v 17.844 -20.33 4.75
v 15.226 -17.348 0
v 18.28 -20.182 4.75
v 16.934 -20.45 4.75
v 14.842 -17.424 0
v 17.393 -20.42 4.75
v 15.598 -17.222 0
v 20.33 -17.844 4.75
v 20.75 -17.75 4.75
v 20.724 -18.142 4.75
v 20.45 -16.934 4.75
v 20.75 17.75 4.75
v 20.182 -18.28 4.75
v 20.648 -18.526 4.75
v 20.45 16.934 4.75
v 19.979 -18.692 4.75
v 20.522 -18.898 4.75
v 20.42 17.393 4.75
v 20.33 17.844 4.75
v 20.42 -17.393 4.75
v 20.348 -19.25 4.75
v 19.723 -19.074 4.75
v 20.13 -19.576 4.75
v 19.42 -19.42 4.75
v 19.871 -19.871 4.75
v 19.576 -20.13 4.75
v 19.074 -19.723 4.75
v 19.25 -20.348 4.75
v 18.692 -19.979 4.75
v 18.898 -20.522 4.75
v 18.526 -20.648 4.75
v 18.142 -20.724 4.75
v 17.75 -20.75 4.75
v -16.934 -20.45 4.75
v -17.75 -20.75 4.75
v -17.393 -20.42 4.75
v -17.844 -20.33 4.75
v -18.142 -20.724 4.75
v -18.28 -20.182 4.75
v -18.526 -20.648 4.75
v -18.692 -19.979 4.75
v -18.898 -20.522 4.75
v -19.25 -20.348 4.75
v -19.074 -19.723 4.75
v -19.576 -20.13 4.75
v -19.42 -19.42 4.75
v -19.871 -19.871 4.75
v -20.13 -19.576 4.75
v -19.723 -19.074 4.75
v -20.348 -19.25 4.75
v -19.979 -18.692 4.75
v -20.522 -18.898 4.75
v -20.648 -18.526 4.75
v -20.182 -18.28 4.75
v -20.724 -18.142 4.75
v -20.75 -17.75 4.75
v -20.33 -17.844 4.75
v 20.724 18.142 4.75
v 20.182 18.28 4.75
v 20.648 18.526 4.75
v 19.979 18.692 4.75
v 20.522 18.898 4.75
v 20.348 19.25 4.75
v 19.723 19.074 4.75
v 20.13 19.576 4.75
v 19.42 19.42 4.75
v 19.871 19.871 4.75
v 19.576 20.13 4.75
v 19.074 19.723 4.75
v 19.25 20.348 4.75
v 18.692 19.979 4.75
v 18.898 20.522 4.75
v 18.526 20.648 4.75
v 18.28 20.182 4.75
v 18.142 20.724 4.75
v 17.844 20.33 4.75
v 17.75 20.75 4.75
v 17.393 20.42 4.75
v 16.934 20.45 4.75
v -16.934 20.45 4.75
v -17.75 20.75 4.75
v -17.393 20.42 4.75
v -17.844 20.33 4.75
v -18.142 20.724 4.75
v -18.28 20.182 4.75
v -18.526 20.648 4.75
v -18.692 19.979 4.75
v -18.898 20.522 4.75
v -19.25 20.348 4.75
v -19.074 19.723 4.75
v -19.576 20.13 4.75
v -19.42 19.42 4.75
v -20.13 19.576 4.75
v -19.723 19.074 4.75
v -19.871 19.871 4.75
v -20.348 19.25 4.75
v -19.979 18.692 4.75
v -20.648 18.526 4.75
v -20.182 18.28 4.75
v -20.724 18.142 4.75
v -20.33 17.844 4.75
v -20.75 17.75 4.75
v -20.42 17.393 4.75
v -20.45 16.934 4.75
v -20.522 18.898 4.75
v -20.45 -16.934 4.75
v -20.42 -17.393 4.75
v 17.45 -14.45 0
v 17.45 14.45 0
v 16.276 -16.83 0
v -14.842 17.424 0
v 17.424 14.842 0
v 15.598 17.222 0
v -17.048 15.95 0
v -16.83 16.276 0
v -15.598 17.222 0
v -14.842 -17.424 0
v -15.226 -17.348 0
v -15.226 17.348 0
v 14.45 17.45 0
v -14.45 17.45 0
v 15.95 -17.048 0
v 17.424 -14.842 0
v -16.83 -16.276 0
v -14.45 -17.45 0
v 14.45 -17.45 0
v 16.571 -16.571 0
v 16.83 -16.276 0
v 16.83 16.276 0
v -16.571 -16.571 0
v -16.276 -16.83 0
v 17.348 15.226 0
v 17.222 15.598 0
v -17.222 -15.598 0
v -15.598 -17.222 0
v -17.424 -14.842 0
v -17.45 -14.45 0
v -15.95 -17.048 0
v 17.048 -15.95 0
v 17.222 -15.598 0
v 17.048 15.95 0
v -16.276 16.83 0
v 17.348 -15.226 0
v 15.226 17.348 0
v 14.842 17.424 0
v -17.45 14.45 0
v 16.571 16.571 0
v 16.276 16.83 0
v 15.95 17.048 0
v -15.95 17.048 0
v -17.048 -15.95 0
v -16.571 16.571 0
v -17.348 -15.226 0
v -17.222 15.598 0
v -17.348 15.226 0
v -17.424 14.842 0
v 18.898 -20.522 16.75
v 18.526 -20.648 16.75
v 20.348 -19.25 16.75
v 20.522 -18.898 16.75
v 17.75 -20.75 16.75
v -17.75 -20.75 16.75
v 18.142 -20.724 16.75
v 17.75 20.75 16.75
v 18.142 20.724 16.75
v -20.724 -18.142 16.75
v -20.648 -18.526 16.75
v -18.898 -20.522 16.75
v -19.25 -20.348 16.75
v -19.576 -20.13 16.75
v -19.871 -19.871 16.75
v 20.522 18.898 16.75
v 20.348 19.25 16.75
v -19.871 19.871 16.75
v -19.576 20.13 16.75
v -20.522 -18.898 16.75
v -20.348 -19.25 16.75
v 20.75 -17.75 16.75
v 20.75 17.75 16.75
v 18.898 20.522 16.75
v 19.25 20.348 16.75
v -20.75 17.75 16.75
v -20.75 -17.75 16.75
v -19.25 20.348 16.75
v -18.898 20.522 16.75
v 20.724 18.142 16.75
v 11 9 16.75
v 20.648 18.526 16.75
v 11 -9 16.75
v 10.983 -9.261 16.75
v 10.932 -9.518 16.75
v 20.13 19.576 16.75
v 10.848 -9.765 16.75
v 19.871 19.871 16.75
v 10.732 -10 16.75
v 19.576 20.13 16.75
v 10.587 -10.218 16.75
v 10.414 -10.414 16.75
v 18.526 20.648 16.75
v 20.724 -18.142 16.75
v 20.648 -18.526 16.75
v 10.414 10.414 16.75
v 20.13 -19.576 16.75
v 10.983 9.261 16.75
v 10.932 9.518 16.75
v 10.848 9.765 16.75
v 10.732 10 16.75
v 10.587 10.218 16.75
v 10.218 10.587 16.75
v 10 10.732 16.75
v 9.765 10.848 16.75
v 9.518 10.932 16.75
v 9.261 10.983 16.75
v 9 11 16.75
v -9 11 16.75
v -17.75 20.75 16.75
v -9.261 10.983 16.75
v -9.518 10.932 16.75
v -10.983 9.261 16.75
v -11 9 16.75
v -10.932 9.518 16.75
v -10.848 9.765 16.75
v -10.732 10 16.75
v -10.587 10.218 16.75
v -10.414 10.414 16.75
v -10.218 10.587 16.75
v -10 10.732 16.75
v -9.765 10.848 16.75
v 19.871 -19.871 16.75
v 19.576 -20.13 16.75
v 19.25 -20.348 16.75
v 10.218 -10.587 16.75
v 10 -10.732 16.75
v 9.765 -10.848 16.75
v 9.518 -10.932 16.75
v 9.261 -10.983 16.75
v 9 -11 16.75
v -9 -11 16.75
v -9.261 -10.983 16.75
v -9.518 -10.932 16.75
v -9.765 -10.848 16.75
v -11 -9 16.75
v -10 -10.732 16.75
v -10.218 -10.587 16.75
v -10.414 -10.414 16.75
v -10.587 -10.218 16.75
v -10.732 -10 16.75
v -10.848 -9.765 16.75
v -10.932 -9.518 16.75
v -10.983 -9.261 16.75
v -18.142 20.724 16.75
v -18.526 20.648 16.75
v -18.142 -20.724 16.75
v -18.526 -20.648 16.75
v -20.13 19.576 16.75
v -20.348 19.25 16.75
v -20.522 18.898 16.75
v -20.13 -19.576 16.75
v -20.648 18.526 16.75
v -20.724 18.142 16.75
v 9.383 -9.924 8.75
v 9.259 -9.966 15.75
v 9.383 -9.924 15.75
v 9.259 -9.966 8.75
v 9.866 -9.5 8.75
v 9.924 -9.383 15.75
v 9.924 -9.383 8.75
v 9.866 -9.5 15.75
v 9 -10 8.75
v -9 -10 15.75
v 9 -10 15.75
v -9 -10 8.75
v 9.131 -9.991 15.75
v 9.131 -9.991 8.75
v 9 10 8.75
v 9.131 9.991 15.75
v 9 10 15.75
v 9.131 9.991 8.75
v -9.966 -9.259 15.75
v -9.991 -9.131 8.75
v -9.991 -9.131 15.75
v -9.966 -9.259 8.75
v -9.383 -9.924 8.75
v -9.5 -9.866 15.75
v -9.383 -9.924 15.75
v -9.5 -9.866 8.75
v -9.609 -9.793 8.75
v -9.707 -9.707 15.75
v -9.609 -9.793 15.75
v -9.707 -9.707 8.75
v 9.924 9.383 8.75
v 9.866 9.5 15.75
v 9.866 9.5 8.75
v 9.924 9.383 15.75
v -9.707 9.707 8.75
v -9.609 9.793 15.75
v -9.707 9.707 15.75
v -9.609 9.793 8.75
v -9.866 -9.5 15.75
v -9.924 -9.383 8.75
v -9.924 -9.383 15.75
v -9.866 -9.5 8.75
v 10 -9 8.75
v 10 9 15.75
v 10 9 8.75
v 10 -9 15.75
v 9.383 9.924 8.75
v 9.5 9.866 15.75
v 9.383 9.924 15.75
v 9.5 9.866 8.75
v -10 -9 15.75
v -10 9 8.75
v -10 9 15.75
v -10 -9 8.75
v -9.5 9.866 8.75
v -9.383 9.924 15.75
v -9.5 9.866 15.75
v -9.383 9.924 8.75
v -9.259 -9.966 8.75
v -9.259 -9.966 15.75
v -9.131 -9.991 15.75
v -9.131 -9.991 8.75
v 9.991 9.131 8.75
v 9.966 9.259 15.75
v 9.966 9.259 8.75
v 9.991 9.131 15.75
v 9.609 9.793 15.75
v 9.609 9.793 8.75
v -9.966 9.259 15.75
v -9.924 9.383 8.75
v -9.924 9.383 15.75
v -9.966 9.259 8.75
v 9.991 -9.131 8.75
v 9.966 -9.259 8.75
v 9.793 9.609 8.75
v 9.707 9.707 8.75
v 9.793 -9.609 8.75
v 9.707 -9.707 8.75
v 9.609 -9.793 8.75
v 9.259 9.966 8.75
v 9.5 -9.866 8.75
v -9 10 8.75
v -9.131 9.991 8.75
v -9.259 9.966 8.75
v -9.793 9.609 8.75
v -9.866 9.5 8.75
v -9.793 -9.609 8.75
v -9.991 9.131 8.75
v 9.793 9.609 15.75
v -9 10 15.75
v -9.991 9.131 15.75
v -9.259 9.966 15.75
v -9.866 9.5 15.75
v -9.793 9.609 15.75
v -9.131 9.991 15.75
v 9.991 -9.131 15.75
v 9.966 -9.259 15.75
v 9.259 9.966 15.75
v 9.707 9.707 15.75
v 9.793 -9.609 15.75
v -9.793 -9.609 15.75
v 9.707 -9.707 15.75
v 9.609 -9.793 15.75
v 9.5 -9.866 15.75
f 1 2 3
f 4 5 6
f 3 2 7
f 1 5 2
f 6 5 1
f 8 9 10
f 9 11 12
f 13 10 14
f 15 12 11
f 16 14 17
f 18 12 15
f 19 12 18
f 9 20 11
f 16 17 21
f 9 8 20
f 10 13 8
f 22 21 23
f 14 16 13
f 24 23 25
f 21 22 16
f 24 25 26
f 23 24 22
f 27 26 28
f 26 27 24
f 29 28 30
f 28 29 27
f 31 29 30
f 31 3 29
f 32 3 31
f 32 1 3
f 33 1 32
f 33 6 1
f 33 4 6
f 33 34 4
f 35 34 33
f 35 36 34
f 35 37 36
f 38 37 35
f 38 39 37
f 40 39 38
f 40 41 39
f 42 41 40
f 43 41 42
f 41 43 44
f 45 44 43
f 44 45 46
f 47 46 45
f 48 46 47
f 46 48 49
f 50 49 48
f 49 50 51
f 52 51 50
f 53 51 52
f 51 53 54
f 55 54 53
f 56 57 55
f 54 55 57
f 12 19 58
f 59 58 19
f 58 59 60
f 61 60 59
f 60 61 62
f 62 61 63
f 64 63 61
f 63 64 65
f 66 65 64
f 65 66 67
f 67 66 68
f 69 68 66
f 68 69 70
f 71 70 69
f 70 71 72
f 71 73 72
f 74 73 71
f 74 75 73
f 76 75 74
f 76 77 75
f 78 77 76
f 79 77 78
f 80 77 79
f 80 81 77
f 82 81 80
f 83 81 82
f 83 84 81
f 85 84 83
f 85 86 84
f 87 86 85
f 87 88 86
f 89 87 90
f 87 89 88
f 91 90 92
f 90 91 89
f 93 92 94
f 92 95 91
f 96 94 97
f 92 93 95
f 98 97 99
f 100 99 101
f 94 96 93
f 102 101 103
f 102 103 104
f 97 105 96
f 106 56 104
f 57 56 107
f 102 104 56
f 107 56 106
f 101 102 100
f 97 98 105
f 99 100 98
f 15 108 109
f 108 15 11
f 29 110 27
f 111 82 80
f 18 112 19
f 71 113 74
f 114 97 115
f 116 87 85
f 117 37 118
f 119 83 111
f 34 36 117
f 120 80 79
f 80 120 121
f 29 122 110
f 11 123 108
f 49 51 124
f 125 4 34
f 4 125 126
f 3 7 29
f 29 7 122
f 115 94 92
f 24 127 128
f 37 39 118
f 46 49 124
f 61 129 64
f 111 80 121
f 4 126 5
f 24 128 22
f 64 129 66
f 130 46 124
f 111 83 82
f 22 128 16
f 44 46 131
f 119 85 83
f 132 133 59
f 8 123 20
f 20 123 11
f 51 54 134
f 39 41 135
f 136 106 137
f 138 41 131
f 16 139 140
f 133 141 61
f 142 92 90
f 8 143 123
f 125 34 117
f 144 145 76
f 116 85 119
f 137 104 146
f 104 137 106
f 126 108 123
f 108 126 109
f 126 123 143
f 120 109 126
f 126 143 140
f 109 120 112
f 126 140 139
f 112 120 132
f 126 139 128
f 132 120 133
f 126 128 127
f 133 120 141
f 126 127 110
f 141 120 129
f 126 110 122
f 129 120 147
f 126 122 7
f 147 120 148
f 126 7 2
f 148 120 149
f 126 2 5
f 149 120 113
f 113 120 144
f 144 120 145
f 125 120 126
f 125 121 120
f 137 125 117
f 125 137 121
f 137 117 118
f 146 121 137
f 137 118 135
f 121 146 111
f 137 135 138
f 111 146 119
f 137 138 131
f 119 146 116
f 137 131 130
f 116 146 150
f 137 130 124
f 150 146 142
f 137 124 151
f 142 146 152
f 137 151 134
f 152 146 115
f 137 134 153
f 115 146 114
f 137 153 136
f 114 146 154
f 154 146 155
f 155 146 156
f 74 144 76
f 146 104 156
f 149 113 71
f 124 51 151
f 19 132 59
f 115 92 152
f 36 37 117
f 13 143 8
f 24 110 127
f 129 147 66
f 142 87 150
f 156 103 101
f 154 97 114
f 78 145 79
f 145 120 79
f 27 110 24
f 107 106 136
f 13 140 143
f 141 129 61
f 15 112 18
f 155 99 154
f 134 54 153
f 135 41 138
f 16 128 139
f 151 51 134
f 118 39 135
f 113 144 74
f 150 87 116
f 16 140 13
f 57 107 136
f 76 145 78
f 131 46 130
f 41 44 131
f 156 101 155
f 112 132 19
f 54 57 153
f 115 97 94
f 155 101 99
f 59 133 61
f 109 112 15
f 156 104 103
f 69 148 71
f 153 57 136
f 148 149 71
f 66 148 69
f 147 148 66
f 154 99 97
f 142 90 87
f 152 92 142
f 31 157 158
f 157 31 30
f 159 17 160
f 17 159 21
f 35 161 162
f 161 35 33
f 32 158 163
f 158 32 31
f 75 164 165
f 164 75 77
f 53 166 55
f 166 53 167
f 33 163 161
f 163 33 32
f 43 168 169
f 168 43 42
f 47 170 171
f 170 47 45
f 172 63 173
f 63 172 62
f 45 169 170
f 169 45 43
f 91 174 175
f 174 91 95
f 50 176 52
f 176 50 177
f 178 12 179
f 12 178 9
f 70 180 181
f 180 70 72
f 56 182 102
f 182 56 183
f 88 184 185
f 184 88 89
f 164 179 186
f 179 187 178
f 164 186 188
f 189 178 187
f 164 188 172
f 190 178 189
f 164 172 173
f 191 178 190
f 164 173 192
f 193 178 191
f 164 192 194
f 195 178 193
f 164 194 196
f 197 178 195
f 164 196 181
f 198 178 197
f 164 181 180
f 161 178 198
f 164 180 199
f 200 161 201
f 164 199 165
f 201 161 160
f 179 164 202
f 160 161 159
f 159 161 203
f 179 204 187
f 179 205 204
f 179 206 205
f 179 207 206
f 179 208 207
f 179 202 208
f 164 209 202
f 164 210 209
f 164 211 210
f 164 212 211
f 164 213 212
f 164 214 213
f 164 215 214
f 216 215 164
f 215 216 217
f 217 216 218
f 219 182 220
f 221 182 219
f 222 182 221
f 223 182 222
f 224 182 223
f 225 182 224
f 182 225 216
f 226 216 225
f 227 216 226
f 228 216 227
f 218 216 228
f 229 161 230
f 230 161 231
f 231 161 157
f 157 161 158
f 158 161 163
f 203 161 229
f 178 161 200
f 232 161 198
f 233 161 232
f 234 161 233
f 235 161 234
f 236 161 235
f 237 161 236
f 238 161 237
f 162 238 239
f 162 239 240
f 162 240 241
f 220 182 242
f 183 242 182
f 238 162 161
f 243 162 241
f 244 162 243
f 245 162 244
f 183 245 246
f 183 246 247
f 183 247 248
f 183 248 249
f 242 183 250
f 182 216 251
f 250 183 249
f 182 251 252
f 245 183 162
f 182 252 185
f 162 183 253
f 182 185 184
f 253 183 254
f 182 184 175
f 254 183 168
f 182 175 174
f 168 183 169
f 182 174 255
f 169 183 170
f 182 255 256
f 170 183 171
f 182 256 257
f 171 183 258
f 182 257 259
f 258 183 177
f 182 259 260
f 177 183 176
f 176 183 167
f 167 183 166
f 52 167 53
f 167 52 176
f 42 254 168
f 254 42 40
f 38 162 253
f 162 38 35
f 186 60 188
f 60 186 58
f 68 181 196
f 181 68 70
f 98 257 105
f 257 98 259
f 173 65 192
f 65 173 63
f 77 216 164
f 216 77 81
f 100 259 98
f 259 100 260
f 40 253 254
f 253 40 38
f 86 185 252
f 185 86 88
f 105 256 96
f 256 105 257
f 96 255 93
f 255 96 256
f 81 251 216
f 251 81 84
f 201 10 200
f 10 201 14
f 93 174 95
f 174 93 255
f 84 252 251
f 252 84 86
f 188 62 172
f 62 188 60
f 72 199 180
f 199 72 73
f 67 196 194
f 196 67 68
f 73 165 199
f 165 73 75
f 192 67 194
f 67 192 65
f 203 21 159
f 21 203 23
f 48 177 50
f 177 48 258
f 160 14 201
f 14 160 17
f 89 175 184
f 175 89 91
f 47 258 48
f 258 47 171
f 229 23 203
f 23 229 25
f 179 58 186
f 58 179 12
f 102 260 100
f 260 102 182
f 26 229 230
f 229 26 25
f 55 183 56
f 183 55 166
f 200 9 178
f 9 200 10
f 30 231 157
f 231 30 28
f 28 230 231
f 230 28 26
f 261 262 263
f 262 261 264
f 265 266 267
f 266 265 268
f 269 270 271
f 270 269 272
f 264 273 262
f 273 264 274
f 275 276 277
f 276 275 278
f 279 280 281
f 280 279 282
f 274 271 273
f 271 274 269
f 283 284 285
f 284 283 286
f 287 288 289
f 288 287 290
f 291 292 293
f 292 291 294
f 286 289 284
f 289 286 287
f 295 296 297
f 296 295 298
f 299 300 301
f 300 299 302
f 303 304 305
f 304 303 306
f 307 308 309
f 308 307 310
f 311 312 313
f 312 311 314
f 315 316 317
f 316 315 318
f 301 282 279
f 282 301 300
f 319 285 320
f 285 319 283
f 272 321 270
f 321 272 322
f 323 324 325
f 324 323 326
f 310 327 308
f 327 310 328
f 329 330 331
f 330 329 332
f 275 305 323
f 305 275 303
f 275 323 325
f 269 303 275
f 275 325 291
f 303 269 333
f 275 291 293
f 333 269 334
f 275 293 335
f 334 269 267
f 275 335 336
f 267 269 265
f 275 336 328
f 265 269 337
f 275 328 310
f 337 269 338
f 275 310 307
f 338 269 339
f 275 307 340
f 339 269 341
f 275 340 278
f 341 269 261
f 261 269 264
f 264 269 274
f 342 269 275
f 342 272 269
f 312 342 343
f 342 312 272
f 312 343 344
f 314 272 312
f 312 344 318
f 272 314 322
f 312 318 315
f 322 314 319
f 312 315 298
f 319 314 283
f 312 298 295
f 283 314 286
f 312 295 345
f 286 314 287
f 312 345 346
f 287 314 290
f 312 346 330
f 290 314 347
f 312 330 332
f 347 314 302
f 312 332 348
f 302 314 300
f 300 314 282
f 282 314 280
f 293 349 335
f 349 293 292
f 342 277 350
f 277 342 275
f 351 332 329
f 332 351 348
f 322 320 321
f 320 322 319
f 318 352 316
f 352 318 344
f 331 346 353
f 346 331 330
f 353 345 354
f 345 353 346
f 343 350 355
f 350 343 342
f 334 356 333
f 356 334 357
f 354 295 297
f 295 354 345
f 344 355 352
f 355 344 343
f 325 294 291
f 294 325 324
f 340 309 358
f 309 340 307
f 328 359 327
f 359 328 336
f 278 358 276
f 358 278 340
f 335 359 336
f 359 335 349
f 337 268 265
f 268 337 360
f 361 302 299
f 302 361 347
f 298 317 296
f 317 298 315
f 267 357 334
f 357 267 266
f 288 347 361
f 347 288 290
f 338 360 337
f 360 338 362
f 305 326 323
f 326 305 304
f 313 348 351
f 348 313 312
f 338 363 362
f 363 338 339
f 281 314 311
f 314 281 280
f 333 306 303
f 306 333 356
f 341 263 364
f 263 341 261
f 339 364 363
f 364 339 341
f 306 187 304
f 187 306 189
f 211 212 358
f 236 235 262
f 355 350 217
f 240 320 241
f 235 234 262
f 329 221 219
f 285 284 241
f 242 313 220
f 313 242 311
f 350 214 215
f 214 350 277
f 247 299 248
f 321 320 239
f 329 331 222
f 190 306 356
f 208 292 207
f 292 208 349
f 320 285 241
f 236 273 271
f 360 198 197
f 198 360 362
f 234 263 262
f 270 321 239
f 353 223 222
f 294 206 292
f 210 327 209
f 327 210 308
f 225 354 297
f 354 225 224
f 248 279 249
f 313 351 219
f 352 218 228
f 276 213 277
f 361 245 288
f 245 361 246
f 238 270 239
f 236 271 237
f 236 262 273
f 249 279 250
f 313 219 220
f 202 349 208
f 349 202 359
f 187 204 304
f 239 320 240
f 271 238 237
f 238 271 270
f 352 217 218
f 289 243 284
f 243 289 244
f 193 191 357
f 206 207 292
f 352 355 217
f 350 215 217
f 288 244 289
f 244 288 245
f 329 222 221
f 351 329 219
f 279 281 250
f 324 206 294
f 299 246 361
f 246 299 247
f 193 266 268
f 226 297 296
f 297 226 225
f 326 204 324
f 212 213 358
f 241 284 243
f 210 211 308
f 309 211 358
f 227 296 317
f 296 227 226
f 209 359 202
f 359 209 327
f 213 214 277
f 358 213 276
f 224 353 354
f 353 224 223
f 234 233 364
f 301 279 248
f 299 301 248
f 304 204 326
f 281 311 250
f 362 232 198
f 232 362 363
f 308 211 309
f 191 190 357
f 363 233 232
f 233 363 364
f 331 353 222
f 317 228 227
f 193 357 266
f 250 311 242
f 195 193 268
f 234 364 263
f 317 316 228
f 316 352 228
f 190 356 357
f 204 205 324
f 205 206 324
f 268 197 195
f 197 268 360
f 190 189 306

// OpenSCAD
// Lab 2: 1x1 Gridfinity fit and robot-calibration holder.
// Confirm the foot against the real grid before using this geometry for other holders.

$fn = 48;

grid_pitch = 42;
foot_top_width = 41.5;
foot_bottom_width = 35.5;
foot_corner_radius = 3;
foot_taper_height = 4.75;

body_width = 41.5;
body_height = 12;
body_corner_radius = 3;

// Replace these placeholders with the measured test object or calibration target.
pocket_x = 20;
pocket_y = 20;
pocket_depth = 8;
pocket_corner_radius = 1;
lead_in = 1;

// Lab 1 found a usable clearance between 0.2 and 0.4 mm; verify the chosen fit on the grid.
foot_clearance = 0.3;

module rounded_rectangle(width, length, radius) {
    offset(r = radius)
        offset(delta = -radius)
            square([width, length], center = true);
}

module gridfinity_foot() {
    linear_extrude(
        height = foot_taper_height,
        scale = (foot_top_width - 2 * foot_clearance) / (foot_bottom_width - 2 * foot_clearance)
    )
        rounded_rectangle(
            foot_bottom_width - 2 * foot_clearance,
            foot_bottom_width - 2 * foot_clearance,
            foot_corner_radius
        );
}

module holder_body() {
    translate([0, 0, foot_taper_height + body_height / 2])
        linear_extrude(height = body_height, center = true)
            rounded_rectangle(body_width, body_width, body_corner_radius);
}

module pocket_cutout() {
    pocket_floor_z = foot_taper_height + body_height - pocket_depth;
    pocket_straight_depth = pocket_depth - lead_in;

    translate([0, 0, pocket_floor_z])
        linear_extrude(height = pocket_straight_depth)
            rounded_rectangle(pocket_x, pocket_y, pocket_corner_radius);

    translate([0, 0, pocket_floor_z + pocket_straight_depth])
        hull() {
            linear_extrude(height = 0.01)
                rounded_rectangle(pocket_x, pocket_y, pocket_corner_radius);
            translate([0, 0, lead_in])
                linear_extrude(height = 0.01)
                    rounded_rectangle(
                        pocket_x + 2 * lead_in,
                        pocket_y + 2 * lead_in,
                        pocket_corner_radius + lead_in
                    );
        }
}

assert(grid_pitch > foot_top_width, "Foot must fit inside one Gridfinity pitch.");
assert(foot_clearance >= 0, "Foot clearance cannot be negative.");
assert(foot_bottom_width > 2 * foot_clearance, "Clearance leaves no foot at the bottom.");
assert(pocket_depth > lead_in && pocket_depth < body_height, "Pocket depth must leave a floor.");
assert(pocket_x + 2 * lead_in < body_width, "Pocket is too wide for the holder body.");
assert(pocket_y + 2 * lead_in < body_width, "Pocket is too long for the holder body.");

difference() {
    union() {
        gridfinity_foot();
        holder_body();
    }
    pocket_cutout();
}
